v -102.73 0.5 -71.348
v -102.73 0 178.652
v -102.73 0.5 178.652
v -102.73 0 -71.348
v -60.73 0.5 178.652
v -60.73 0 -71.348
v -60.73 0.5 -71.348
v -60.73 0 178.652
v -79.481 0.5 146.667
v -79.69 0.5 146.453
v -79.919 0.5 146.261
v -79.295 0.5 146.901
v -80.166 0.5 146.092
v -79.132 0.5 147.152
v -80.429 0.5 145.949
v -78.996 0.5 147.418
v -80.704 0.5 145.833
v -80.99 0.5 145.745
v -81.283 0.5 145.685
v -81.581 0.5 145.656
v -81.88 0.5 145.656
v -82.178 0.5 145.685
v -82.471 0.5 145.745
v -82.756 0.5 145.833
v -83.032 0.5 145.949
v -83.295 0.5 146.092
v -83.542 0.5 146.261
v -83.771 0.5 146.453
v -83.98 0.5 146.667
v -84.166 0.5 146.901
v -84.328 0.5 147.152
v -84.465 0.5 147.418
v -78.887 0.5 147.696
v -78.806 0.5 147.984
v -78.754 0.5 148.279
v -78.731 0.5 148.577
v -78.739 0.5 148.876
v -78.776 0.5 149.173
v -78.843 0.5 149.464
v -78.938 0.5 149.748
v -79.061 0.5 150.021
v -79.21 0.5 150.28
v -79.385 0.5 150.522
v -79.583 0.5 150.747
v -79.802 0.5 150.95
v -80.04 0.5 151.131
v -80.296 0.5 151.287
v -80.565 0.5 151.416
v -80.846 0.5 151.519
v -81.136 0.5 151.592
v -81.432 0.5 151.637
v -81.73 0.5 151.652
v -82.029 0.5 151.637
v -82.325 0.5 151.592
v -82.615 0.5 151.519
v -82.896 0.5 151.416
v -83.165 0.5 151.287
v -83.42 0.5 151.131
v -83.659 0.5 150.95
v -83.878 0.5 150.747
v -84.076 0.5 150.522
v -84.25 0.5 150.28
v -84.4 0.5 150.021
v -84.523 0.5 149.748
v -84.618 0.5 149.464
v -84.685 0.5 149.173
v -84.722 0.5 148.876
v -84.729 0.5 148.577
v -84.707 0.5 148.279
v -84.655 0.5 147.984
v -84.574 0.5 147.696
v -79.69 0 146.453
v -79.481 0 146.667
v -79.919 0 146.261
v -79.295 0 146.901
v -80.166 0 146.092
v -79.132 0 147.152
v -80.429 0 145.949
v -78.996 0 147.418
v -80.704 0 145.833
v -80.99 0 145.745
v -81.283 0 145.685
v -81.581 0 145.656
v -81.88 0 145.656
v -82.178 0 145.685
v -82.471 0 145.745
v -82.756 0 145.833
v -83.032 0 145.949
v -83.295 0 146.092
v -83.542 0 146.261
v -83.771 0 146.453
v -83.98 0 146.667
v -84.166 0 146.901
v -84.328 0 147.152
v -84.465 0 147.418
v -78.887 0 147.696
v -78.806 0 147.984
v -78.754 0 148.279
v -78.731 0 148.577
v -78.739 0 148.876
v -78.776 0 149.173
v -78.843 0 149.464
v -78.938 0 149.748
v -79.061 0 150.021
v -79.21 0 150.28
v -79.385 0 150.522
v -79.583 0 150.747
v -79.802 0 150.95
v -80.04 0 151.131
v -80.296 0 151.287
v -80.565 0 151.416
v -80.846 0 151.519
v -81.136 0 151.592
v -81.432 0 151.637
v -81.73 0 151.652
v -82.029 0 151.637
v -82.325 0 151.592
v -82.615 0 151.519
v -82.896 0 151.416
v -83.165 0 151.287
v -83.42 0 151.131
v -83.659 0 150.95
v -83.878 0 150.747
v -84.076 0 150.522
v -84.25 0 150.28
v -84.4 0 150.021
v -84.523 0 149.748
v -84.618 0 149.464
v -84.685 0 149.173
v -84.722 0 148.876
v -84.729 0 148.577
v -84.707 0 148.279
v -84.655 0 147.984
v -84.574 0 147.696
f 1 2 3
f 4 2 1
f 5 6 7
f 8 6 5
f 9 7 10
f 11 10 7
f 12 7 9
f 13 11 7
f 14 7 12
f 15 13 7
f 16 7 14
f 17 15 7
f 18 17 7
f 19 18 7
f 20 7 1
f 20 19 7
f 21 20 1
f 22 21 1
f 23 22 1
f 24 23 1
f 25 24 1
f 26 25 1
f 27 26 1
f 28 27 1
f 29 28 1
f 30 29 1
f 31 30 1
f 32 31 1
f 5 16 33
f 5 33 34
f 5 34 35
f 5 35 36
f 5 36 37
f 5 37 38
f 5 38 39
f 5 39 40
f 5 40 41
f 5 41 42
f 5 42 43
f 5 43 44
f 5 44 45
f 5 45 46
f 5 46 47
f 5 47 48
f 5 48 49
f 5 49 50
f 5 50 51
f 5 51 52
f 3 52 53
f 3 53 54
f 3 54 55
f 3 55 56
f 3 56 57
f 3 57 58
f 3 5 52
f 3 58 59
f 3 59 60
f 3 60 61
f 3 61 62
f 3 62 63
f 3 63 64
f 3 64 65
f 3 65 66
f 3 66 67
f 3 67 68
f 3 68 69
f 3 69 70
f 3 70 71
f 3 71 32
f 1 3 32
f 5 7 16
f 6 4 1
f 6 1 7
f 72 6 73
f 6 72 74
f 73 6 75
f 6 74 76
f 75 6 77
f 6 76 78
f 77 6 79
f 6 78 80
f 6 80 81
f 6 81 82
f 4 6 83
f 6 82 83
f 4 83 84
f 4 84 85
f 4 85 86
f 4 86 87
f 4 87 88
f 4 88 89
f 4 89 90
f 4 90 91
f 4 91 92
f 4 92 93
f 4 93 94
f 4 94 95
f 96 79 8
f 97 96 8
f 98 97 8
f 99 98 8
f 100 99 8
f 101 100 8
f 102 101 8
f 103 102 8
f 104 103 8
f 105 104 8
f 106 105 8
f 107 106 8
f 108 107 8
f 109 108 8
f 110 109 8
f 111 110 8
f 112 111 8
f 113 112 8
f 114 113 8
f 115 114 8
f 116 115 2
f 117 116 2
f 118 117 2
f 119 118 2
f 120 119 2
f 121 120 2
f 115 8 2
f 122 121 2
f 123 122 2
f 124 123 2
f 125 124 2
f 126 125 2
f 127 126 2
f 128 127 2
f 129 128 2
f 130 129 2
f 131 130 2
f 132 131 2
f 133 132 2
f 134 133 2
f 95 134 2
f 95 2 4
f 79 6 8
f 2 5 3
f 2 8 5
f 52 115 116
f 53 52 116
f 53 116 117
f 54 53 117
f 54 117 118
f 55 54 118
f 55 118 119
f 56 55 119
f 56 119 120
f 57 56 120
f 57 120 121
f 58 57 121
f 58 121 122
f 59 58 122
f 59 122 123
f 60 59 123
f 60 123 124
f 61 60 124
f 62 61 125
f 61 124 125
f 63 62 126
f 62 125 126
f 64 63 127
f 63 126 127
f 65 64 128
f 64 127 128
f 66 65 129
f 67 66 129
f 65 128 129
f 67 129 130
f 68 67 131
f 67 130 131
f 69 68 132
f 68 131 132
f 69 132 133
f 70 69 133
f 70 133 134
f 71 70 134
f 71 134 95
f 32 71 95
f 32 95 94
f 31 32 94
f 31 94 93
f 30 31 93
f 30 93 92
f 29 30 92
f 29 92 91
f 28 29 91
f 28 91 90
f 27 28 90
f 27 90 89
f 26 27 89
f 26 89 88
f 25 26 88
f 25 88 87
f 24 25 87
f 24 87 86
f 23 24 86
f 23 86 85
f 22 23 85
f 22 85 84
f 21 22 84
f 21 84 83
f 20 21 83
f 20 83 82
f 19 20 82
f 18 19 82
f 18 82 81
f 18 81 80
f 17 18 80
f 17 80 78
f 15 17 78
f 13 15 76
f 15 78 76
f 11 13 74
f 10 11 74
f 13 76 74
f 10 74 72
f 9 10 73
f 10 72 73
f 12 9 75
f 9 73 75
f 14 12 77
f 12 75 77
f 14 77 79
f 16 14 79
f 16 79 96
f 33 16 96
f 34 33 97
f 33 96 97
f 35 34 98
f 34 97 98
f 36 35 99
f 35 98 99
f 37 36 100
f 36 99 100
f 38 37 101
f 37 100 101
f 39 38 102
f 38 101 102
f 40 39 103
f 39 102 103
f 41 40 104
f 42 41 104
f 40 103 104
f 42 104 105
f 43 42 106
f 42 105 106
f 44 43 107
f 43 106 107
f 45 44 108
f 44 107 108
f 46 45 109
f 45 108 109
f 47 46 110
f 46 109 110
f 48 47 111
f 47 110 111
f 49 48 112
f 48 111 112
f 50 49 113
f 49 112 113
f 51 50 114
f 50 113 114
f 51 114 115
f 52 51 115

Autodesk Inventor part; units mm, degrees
ref_plane "YZ Plane" through (0, 0, 0) normal (1, 0, 0) x (0, 1, 0)
ref_plane "XZ Plane" through (0, 0, 0) normal (0, 1, 0) x (-1, 0, 0)
ref_plane "XY Plane" through (0, 0, 0) normal (0, 0, 1) x (1, 0, 0)
sketch "Sketch1" plane through (0, 0, 0) normal (0, 1, 0) x (-1, 0, 0)
  line L0 (102.7304, -71.3481) -> (60.7304, -71.3481)
  line L1 (60.7304, -71.3481) -> (60.7304, 178.6519)
  line L2 (60.7304, 178.6519) -> (102.7304, 178.6519)
  line L3 (102.7304, 178.6519) -> (102.7304, -71.3481)
  point P0 (0, 0)
  dimension "d0" = 42
  dimension "d1" = 250
extrude "Plate1" add sketch "Sketch1" along normal blind 0.5
sketch "Sketch2" plane through (0, 0.5, 0) normal (0, 1, 0) x (1, 0, 0)
  line L0 (-102.7304, -178.6519) -> (-102.7304, 71.3481) projected
  line L1 (-60.7304, -178.6519) -> (-102.7304, -178.6519) projected
  point P0 (0, 0)
  point P1 (-81.7304, -148.6519)
  dimension "d3" = 21
  dimension "d4" = 30
hole "Hole1" at (-81.7304, 0.5, 148.6519) direction (0, -1, 0) diameter 6 depth 0.5 tip angle 118
equation "\"d10\" = Thickness"
equation "\"d2\" = Thickness"
equation "\"BendRadius\" = Thickness"
equation "\"BendReliefWidth\" = Thickness"
equation "\"BendReliefDepth\" = 0.5 * Thickness"
equation "\"CornerReliefSize\" = 4 * Thickness"
equation "\"MinimumRemnant\" = 2 * Thickness"
equation "\"TransitionRadius\" = BendRadius"
equation "\"JacobiRadiusSize\" = BendRadius"
equation "\"GapSize\" = Thickness"
equation "\"Thickness\" = 0.5"
properties part number "case"
